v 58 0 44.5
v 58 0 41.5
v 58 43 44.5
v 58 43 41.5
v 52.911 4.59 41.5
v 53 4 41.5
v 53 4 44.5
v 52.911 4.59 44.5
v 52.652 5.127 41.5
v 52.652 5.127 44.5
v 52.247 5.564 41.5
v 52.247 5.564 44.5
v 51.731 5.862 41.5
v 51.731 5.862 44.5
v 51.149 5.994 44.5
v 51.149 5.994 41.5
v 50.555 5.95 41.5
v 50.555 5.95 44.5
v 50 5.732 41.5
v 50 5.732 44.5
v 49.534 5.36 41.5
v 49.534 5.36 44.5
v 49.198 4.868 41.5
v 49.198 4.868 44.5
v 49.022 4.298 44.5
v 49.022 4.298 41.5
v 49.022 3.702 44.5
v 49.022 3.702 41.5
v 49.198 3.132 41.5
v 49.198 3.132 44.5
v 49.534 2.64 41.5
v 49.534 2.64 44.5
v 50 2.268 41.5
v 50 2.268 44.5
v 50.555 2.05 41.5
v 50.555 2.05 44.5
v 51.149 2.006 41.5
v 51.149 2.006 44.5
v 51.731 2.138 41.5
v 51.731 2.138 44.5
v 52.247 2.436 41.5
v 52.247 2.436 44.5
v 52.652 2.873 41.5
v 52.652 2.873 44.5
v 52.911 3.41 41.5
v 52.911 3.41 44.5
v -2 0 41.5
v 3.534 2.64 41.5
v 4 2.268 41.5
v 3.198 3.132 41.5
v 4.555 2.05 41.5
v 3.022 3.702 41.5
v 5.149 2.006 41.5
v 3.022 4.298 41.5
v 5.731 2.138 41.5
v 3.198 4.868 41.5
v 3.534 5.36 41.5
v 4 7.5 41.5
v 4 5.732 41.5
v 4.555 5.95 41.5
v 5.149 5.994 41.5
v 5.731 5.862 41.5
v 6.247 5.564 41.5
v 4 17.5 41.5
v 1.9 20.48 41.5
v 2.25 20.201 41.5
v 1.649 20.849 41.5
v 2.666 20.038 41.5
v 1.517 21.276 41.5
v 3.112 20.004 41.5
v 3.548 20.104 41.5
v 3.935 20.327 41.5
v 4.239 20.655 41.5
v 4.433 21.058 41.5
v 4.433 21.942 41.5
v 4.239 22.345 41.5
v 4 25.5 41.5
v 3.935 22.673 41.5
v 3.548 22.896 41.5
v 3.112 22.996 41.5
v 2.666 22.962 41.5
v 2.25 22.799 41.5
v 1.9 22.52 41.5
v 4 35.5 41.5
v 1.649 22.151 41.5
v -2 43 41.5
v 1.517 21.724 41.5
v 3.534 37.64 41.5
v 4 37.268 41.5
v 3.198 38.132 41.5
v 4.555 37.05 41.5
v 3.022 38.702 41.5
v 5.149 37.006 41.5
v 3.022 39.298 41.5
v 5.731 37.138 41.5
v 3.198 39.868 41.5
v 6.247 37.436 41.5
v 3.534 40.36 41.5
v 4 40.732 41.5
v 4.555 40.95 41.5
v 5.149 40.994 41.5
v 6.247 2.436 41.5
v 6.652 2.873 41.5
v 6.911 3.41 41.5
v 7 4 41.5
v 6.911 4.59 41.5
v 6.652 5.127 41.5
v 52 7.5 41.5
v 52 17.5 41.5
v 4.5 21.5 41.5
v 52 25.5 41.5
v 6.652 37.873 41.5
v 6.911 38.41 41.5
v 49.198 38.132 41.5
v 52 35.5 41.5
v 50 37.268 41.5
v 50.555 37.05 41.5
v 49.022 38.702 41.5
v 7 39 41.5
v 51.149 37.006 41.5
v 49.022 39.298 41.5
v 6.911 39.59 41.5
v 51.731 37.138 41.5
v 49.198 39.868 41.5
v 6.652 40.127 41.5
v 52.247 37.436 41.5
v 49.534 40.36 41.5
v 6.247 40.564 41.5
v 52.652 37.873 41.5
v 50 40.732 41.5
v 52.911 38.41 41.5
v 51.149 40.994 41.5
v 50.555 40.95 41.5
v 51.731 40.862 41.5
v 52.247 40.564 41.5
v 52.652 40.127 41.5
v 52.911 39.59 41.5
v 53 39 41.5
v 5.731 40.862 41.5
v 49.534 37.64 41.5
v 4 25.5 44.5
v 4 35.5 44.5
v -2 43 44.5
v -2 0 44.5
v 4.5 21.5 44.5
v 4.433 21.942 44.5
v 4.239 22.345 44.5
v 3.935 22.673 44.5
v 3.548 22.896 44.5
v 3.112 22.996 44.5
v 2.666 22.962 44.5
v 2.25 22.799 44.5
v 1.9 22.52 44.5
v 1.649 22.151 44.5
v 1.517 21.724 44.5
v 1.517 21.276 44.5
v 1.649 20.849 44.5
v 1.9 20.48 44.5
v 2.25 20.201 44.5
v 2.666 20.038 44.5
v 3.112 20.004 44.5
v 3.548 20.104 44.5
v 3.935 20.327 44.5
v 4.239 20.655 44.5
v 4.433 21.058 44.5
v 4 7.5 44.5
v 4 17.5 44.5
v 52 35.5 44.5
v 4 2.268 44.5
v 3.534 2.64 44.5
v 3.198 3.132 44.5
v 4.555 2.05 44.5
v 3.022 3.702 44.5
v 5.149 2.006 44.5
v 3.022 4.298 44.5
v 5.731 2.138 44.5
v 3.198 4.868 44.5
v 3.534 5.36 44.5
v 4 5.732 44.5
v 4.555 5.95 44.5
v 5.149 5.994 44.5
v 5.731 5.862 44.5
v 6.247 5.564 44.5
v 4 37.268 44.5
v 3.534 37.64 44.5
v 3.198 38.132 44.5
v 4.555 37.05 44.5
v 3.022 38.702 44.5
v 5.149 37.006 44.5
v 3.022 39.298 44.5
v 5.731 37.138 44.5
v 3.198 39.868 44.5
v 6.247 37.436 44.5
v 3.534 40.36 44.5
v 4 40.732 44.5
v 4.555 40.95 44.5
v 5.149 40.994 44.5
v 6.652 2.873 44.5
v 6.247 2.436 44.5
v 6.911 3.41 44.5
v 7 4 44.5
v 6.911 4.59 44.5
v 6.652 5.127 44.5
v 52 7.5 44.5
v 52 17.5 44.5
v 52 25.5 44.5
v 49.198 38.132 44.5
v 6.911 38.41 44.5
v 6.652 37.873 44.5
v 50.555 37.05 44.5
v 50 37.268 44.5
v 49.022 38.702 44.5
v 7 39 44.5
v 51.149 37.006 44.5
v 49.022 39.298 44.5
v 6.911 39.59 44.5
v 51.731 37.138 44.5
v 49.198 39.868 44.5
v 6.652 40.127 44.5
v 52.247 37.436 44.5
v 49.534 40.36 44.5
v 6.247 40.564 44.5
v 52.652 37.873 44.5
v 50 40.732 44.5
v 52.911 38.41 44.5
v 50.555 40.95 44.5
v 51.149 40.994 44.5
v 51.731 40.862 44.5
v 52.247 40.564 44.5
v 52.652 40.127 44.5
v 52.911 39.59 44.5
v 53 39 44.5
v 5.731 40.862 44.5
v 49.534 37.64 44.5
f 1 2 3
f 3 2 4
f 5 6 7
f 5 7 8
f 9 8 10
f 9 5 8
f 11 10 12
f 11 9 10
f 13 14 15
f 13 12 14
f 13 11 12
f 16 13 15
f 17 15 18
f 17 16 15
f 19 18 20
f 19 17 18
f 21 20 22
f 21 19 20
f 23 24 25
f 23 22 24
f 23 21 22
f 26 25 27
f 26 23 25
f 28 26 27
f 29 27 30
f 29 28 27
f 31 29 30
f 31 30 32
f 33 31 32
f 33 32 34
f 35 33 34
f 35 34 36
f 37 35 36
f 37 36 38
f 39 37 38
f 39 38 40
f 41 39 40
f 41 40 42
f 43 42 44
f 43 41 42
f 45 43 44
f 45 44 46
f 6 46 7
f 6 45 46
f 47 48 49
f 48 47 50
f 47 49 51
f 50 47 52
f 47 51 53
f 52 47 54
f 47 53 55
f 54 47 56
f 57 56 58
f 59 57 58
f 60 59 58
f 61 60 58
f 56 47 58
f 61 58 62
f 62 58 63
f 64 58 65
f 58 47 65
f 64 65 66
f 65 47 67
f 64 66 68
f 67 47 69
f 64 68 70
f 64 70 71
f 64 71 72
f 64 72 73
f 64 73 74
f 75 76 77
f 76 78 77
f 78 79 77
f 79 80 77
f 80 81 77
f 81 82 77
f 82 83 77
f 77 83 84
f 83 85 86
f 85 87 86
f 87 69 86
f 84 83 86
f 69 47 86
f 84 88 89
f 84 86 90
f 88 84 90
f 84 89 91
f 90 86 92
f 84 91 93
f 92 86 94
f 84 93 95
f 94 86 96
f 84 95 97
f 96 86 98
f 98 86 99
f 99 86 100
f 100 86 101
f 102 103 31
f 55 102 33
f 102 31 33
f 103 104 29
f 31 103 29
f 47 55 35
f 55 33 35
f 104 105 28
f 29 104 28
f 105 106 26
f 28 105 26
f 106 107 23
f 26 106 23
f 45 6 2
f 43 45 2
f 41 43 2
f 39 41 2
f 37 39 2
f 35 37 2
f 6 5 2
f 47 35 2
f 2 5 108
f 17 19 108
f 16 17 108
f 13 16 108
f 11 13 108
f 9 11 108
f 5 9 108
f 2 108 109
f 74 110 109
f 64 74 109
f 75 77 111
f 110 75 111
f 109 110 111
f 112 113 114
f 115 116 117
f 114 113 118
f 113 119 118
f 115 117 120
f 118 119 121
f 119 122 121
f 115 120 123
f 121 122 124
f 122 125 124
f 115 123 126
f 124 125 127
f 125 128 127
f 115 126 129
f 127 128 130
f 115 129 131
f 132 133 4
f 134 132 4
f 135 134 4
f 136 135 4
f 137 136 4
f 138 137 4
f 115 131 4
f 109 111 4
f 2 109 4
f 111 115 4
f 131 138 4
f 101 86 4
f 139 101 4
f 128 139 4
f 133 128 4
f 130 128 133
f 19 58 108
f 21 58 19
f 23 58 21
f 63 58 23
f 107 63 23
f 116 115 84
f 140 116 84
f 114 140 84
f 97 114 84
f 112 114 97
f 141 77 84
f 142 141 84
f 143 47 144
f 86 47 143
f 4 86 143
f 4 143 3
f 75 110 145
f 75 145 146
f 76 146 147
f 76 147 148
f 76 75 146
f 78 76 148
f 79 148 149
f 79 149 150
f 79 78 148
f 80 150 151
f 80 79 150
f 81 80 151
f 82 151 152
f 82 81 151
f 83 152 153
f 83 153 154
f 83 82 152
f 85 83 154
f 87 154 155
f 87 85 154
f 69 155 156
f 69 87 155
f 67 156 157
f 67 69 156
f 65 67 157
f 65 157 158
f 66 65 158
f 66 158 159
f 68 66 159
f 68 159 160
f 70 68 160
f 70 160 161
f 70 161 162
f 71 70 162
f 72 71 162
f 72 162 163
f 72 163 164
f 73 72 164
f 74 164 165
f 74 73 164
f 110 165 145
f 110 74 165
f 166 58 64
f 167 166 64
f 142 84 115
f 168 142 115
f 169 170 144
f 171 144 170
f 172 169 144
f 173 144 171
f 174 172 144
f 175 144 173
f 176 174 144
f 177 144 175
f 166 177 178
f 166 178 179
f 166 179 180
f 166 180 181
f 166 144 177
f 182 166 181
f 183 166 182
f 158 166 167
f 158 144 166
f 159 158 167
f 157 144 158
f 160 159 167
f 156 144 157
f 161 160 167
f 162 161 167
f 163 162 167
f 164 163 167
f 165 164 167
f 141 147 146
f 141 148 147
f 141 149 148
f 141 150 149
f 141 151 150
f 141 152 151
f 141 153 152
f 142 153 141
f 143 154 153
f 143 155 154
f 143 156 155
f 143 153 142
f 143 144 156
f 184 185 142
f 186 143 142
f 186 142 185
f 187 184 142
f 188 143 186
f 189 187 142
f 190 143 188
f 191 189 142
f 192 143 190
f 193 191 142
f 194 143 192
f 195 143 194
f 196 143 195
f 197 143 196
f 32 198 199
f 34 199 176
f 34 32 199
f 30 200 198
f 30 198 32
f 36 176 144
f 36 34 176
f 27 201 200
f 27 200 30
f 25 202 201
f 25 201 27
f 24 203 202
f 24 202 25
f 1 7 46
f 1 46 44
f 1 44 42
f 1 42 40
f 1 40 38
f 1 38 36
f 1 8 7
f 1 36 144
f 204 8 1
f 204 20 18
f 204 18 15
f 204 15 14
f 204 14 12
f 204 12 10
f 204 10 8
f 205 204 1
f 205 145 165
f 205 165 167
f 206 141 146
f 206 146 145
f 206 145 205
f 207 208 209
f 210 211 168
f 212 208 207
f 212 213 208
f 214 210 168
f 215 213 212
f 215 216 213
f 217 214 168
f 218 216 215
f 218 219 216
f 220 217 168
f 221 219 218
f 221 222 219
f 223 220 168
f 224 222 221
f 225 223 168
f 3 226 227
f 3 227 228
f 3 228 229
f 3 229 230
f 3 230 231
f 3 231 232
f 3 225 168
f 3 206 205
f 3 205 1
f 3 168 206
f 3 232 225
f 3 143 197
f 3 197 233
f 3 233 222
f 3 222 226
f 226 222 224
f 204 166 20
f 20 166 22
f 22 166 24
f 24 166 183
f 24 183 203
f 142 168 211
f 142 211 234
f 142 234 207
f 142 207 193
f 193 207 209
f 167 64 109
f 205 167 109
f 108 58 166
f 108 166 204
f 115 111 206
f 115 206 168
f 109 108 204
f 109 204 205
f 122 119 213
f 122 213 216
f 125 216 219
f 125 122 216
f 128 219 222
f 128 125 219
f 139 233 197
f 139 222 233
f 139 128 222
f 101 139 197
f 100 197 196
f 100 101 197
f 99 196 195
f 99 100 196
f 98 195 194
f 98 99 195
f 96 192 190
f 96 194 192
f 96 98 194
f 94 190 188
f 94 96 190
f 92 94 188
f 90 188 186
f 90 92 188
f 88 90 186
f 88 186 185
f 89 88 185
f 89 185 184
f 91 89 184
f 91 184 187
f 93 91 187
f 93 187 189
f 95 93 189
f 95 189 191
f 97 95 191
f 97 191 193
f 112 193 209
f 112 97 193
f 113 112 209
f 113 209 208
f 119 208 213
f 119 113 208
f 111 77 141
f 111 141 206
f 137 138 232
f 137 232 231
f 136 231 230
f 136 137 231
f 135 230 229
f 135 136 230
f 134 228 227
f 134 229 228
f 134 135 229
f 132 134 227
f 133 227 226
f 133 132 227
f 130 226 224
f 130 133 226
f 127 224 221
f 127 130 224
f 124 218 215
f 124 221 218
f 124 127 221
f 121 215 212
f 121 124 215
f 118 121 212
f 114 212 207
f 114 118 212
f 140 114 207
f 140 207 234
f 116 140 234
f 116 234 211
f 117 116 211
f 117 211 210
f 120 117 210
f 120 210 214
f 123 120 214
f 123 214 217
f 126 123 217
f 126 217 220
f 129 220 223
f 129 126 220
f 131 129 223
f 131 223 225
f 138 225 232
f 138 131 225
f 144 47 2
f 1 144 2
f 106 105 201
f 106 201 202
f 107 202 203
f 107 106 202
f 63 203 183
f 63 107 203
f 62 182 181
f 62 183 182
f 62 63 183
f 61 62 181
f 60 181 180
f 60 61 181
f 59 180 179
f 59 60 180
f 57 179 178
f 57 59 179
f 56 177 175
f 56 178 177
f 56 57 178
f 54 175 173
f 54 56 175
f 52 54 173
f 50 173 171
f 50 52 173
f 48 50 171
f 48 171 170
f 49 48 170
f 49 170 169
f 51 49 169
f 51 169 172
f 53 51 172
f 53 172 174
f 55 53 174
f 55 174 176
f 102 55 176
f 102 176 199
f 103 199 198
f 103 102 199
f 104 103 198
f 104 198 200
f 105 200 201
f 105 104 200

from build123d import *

# Parameters (mm, degrees)
CYLINDER004_R     = 2
CYLINDER004_DEPTH = 10
CYLINDER005_R     = 2
CYLINDER005_DEPTH = 10
CYLINDER006_R     = 2
CYLINDER006_DEPTH = 10
CYLINDER003_R     = 2
CYLINDER003_DEPTH = 10
SKETCH001_W       = 60
SKETCH001_H       = 43
SKETCH001_R       = 1.5
SKETCH001_W_2     = 48
SKETCH001_H_2     = 10
EXTRUDE001_DEPTH  = 3


with BuildPart() as cylinder004:
    # Cylinder004 → Cylinder004 (new body)
    with BuildSketch(Plane(origin=(5, 39, 40), x_dir=(1, 0, 0), z_dir=(0, 0, 1))):
        Circle(CYLINDER004_R)
    extrude(amount=CYLINDER004_DEPTH)


with BuildPart() as cylinder005:
    # Cylinder005 → Cylinder005 (new body)
    with BuildSketch(Plane(origin=(51, 39, 40), x_dir=(1, 0, 0), z_dir=(0, 0, 1))):
        Circle(CYLINDER005_R)
    extrude(amount=CYLINDER005_DEPTH)


with BuildPart() as cylinder006:
    # Cylinder006 → Cylinder006 (new body)
    with BuildSketch(Plane(origin=(51, 4, 40), x_dir=(1, 0, 0), z_dir=(0, 0, 1))):
        Circle(CYLINDER006_R)
    extrude(amount=CYLINDER006_DEPTH)


with BuildPart() as fusion008:
    # Cylinder003 → Cylinder003 (new body)
    with BuildSketch(Plane(origin=(5, 4, 40), x_dir=(1, 0, 0), z_dir=(0, 0, 1))):
        Circle(CYLINDER003_R)
    extrude(amount=CYLINDER003_DEPTH)

    # Fusion008: union Cylinder004, Cylinder005, Cylinder006
    add(cylinder004.part)
    add(cylinder005.part)
    add(cylinder006.part)


with BuildPart() as cut004:
    # Sketch001 → Extrude001 (new body)
    with BuildSketch(Plane.XY):
        with Locations((-30, 21.5)):
            Rectangle(SKETCH001_W, SKETCH001_H)
        with Locations((-55, 21.5)):
            Circle(SKETCH001_R, mode=Mode.SUBTRACT)
        with Locations((-30, 12.5)):
            Rectangle(SKETCH001_W_2, SKETCH001_H_2, mode=Mode.SUBTRACT)
        with Locations((-30, 30.5)):
            Rectangle(SKETCH001_W_2, SKETCH001_H_2, mode=Mode.SUBTRACT)
    extrude(amount=EXTRUDE001_DEPTH)


with BuildPart() as cut004_1:
    # Extrude001 placement: moved
    add(cut004.part.moved(Location((58, 0, 41.5))))

    # Cut004: cut Fusion008
    add(fusion008.part, mode=Mode.SUBTRACT)


solid = cut004_1.part
